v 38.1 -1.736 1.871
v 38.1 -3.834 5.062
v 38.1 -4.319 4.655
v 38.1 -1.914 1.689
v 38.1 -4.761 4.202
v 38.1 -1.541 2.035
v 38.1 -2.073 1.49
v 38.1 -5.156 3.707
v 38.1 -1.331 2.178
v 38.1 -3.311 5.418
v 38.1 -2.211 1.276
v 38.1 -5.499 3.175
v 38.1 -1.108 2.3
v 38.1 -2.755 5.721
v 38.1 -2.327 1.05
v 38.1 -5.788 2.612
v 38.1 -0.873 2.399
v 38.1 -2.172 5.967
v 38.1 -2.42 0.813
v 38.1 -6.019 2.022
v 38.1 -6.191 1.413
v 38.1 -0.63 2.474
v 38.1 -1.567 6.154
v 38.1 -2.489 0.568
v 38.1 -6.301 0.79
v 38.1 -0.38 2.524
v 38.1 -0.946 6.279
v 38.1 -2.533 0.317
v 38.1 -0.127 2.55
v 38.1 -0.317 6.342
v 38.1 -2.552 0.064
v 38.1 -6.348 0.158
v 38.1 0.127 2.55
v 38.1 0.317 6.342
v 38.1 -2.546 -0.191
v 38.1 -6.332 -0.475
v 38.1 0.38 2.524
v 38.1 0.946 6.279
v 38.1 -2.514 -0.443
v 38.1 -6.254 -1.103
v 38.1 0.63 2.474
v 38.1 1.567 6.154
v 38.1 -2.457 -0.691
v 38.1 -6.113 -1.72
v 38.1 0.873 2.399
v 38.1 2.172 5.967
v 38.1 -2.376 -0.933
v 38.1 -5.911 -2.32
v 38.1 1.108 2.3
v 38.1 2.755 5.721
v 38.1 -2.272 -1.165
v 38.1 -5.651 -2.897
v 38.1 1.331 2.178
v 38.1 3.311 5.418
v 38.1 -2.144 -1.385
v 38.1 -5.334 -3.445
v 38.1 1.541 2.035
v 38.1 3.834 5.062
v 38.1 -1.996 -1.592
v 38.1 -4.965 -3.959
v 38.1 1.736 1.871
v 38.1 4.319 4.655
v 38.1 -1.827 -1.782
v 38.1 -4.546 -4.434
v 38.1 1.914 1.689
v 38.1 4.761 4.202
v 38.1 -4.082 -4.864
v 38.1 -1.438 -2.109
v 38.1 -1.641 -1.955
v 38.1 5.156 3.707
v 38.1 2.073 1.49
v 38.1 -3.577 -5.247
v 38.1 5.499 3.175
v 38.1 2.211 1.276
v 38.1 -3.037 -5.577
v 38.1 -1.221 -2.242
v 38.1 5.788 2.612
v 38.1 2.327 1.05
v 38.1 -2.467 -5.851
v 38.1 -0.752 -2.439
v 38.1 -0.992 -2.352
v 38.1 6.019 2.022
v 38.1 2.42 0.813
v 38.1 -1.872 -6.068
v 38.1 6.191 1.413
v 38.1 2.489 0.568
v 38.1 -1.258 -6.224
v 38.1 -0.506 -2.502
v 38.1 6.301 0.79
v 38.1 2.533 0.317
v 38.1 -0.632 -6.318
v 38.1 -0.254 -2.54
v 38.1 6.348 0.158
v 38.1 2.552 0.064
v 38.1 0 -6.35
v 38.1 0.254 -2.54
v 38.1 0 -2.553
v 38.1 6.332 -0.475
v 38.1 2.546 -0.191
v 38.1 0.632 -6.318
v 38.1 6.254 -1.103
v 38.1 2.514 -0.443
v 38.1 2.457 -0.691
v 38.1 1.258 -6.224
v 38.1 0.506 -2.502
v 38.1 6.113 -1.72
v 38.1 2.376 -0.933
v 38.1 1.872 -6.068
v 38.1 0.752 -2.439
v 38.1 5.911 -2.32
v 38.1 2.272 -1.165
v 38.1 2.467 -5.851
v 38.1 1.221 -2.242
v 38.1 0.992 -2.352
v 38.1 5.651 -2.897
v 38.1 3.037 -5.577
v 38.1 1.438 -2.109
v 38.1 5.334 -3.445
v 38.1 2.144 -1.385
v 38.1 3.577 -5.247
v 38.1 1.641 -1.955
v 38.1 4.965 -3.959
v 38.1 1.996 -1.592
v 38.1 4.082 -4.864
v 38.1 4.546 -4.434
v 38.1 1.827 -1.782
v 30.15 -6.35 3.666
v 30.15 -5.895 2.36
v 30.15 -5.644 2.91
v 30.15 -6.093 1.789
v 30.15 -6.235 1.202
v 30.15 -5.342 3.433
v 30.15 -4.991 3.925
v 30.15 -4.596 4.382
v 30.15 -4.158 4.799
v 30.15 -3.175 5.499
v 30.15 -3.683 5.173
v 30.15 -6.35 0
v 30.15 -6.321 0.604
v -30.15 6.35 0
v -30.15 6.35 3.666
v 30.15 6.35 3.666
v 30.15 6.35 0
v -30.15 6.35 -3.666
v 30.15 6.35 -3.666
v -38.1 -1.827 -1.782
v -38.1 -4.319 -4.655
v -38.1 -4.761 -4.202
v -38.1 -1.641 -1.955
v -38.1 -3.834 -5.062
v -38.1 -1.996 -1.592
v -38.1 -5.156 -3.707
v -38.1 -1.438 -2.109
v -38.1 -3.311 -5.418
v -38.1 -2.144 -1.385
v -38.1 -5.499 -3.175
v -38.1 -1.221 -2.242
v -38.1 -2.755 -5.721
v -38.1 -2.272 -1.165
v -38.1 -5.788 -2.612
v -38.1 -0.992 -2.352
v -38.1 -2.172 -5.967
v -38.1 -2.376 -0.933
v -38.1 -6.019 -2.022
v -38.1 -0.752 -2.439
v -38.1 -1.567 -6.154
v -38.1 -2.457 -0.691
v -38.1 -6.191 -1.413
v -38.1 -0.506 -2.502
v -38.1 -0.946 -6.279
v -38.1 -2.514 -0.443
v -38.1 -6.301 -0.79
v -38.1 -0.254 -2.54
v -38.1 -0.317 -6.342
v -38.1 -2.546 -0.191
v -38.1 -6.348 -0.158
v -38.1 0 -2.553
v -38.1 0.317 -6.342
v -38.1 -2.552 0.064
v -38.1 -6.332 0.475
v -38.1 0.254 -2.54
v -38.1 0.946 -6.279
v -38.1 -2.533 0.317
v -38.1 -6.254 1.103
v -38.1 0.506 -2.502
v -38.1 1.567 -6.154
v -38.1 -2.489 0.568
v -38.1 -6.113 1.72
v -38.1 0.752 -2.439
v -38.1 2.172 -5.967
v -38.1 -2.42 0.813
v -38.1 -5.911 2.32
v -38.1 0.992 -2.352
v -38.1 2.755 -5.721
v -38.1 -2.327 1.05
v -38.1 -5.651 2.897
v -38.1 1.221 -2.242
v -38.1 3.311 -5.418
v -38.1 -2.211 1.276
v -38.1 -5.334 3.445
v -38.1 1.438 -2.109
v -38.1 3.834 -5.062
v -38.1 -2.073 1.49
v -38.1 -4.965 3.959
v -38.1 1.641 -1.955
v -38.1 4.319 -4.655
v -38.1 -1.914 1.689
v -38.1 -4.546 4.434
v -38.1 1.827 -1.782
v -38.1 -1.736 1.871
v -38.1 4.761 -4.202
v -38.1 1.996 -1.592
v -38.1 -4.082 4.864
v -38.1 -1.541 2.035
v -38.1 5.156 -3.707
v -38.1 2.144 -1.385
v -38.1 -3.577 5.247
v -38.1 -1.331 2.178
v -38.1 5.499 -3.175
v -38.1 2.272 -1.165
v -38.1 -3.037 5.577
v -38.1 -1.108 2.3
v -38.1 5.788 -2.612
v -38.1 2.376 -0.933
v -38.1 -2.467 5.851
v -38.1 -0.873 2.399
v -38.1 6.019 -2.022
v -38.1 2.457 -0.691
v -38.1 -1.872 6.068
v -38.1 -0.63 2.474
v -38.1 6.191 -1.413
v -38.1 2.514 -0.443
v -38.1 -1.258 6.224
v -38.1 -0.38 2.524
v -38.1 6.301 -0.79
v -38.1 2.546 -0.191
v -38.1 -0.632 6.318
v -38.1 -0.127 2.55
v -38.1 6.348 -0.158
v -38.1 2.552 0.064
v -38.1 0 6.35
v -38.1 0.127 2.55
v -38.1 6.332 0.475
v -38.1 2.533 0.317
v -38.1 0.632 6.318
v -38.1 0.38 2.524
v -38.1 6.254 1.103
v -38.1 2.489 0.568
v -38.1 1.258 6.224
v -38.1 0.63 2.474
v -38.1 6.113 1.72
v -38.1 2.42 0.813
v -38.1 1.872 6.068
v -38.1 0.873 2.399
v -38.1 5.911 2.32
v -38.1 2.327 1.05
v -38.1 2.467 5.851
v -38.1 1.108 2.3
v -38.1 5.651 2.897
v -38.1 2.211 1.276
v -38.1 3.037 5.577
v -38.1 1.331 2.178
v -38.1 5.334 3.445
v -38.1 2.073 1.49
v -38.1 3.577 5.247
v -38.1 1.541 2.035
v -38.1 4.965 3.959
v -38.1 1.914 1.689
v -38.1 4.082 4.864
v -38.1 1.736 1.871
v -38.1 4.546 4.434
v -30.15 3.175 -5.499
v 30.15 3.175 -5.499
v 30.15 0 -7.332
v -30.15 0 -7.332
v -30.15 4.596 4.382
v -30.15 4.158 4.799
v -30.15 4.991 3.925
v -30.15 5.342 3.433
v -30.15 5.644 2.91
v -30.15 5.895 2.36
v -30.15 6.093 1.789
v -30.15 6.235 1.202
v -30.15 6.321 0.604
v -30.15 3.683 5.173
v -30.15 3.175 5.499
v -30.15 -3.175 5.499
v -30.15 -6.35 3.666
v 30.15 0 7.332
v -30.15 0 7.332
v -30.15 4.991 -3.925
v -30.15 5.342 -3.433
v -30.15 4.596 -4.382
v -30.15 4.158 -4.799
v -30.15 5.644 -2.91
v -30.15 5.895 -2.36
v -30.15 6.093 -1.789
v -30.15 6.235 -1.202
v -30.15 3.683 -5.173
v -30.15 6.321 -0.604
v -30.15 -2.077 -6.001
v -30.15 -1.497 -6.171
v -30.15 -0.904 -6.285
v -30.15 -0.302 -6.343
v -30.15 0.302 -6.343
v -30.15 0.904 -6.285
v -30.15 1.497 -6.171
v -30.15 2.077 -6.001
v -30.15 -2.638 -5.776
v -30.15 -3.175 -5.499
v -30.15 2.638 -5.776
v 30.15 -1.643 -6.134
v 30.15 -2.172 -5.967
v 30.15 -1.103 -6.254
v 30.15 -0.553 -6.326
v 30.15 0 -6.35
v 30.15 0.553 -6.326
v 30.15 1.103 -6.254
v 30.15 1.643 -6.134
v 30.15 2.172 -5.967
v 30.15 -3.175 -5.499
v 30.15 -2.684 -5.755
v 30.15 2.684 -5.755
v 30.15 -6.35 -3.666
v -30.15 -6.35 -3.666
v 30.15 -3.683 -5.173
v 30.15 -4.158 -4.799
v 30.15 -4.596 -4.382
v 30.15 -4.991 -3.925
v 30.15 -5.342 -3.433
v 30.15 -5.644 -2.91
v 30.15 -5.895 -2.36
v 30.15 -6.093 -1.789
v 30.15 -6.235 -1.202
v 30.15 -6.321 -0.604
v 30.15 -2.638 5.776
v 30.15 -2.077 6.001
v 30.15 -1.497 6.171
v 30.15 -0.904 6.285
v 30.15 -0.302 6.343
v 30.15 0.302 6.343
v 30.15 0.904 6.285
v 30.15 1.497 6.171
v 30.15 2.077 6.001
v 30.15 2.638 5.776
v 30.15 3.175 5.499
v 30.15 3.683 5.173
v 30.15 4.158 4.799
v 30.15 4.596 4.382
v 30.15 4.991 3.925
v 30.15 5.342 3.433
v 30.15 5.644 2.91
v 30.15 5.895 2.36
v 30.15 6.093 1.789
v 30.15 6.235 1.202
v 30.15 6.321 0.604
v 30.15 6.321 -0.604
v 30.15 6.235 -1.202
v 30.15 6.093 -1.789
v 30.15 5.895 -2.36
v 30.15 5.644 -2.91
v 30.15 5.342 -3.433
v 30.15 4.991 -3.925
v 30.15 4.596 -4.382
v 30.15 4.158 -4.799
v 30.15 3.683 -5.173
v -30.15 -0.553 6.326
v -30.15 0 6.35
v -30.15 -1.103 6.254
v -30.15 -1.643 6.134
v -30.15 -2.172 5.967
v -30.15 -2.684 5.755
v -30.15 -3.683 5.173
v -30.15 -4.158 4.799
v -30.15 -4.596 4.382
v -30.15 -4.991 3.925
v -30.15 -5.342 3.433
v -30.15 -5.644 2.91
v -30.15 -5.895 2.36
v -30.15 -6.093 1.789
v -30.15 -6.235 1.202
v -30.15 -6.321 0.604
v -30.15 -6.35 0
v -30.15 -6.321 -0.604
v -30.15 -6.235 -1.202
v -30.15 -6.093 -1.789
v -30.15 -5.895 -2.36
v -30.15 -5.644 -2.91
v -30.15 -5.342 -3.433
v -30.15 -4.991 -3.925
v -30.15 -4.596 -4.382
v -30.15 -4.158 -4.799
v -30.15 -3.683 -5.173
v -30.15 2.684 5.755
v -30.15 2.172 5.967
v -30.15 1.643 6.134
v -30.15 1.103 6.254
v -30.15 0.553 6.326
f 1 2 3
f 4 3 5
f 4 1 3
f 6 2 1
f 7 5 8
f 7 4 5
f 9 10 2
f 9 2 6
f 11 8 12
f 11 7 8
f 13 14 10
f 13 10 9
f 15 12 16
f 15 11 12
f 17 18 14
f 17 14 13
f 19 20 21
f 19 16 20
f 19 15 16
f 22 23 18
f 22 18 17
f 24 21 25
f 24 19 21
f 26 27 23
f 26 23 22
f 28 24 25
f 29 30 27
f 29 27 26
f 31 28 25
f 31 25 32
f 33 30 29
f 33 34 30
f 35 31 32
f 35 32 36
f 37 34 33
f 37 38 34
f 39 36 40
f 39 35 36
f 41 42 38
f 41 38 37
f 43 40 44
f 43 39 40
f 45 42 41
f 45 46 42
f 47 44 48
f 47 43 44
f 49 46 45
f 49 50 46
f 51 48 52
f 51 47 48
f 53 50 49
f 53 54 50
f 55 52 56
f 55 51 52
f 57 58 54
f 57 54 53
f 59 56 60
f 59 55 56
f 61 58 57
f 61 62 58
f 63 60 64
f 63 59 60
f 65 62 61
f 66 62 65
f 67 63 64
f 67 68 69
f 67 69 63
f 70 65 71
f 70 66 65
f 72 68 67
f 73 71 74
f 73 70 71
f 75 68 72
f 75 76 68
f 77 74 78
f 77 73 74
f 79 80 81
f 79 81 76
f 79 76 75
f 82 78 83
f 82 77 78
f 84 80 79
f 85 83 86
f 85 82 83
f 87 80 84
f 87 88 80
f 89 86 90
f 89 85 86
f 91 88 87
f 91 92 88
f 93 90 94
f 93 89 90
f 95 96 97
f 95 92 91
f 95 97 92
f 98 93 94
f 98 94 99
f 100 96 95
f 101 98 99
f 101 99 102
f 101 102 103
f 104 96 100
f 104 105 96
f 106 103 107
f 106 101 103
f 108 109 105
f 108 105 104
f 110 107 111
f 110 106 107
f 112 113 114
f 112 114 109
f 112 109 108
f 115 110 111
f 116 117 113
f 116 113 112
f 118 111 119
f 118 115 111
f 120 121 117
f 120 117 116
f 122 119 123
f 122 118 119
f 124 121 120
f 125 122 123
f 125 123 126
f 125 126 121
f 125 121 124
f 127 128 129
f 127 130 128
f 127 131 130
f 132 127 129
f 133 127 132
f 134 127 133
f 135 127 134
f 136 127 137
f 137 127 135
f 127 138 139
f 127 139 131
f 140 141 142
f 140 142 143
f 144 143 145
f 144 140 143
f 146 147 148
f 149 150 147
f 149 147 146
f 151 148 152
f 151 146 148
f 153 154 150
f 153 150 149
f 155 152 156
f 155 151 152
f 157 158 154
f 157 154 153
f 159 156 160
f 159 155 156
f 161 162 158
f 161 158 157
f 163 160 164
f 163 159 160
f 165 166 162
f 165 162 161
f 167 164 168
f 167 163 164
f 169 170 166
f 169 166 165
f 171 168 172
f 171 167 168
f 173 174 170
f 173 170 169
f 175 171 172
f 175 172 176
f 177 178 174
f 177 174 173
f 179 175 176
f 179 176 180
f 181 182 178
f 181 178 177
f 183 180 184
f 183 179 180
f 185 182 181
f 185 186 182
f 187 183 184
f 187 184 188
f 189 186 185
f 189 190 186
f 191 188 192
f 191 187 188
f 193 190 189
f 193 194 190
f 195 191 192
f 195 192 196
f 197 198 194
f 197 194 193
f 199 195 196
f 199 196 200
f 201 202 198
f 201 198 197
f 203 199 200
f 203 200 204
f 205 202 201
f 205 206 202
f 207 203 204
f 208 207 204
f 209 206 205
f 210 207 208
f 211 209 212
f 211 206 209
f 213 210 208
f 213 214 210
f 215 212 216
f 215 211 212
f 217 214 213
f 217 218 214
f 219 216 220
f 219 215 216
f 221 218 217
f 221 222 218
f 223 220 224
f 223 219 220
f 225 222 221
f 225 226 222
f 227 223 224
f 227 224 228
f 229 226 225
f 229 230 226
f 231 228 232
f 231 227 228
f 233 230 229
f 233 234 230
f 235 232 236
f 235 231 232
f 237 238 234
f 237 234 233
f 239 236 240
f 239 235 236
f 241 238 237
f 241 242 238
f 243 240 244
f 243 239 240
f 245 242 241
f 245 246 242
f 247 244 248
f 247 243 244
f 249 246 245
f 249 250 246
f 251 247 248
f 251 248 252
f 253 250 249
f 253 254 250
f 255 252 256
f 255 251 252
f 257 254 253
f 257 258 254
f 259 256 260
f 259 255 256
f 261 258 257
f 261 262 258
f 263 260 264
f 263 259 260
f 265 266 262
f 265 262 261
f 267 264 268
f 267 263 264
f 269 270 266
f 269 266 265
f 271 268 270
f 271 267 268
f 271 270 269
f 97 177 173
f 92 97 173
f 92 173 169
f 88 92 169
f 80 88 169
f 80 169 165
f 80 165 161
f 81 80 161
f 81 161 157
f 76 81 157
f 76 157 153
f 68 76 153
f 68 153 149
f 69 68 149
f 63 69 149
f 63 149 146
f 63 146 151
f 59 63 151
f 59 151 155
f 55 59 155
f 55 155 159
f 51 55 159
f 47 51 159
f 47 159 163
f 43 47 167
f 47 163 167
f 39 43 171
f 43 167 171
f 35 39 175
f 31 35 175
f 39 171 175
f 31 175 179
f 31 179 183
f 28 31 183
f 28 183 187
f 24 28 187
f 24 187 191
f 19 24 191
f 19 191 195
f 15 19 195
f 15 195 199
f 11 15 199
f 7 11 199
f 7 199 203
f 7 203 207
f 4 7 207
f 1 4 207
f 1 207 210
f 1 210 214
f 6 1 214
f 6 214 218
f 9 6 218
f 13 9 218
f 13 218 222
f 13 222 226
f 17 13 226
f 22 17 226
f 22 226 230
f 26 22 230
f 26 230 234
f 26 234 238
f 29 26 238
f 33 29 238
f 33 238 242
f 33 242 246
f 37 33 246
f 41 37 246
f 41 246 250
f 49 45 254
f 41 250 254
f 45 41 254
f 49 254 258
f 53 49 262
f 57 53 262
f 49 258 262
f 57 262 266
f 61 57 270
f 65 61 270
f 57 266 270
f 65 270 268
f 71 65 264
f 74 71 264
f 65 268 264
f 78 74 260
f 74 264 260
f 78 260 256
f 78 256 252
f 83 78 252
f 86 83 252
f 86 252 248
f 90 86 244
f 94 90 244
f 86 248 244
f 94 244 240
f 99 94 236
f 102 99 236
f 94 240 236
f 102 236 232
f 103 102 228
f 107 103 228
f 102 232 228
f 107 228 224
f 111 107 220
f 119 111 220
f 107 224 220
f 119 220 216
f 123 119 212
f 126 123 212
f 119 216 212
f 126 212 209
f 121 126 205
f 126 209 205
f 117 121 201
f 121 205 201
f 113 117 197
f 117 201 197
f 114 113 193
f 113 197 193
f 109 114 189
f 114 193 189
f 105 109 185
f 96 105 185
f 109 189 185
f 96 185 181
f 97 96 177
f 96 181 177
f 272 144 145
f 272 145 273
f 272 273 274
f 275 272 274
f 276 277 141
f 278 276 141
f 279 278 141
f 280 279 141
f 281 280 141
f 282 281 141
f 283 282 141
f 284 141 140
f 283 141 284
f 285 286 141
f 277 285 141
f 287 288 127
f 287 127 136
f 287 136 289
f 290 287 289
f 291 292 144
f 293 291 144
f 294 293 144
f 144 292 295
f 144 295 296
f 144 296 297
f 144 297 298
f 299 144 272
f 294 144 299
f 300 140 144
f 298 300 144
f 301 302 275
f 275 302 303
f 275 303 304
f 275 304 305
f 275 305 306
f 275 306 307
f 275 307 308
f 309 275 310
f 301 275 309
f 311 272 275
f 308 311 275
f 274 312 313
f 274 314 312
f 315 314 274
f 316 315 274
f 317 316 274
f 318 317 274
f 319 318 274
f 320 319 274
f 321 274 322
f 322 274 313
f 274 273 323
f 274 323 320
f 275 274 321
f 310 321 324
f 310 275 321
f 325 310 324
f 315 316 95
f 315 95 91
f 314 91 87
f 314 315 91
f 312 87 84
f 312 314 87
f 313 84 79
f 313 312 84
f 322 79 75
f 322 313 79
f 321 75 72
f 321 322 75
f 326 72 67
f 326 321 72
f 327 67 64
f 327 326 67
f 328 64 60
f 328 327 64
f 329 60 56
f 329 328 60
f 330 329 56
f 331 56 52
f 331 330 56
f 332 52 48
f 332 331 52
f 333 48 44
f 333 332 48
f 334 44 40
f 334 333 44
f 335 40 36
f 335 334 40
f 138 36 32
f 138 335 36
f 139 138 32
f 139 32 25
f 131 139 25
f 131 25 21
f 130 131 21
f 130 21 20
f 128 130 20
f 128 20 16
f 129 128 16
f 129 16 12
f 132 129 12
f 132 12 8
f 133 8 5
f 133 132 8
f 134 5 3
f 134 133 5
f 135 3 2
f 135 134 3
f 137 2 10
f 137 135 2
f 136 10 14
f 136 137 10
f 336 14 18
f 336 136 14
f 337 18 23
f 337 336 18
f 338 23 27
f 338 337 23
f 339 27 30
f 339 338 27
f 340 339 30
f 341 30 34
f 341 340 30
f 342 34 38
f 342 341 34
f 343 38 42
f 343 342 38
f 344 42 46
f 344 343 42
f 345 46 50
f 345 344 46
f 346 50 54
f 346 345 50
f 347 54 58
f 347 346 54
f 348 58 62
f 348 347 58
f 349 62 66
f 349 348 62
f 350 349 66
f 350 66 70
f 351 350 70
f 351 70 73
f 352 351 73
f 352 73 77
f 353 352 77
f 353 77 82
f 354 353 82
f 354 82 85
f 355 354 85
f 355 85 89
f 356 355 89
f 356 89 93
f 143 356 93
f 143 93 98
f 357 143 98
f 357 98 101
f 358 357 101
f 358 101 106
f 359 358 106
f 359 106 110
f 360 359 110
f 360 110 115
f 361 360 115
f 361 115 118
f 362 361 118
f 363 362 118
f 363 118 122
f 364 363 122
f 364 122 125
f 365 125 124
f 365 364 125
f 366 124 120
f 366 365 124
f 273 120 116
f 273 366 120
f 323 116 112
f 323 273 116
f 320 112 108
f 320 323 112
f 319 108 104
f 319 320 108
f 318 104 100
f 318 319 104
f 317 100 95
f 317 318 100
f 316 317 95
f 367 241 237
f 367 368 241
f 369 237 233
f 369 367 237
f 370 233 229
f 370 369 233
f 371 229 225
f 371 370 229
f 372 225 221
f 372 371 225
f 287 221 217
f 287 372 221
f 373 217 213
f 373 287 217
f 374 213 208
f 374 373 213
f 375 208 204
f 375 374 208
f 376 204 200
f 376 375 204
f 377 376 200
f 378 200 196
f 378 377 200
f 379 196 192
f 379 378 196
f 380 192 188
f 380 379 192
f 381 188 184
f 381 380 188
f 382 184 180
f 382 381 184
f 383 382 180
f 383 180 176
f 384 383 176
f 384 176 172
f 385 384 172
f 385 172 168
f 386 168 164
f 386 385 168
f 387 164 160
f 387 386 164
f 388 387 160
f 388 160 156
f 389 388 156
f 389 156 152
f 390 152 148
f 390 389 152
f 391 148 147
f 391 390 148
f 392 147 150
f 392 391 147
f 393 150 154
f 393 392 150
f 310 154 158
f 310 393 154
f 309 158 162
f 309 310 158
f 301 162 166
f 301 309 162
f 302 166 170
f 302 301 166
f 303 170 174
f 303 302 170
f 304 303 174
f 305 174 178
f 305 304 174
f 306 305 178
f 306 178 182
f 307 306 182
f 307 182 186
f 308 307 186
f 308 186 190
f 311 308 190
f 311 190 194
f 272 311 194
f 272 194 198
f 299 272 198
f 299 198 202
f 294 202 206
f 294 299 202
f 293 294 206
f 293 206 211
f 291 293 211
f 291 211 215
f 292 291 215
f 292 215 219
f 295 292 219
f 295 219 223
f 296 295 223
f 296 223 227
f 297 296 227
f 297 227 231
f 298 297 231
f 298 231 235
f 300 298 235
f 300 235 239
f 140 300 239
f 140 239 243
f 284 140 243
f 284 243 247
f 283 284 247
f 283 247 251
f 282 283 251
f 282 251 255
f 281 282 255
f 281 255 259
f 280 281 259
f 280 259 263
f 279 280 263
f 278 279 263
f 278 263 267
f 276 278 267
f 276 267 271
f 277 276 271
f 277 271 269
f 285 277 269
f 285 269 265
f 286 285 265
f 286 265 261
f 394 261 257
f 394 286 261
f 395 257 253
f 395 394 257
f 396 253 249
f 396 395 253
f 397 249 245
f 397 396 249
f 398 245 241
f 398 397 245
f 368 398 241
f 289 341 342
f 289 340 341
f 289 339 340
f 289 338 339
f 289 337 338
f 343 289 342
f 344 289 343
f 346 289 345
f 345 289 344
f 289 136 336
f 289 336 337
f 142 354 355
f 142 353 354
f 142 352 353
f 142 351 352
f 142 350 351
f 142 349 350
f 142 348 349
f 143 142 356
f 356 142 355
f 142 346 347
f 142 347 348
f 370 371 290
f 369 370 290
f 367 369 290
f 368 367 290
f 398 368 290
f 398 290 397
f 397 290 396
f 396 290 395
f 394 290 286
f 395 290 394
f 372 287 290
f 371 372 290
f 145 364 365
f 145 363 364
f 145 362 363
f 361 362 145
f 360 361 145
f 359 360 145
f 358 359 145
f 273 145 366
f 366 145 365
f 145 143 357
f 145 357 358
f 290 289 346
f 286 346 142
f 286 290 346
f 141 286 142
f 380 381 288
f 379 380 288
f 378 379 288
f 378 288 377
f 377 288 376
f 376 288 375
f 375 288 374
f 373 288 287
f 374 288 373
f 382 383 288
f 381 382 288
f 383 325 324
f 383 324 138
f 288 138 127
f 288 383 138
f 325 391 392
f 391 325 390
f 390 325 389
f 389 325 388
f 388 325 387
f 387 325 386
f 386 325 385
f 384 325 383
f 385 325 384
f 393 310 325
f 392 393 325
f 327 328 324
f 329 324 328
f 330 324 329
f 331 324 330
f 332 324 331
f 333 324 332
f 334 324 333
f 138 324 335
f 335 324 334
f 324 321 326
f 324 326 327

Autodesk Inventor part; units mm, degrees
ref_plane "YZ Plane" through (0, 0, 0) normal (1, 0, 0) x (0, 1, 0)
ref_plane "XZ Plane" through (0, 0, 0) normal (0, 1, 0) x (-1, 0, 0)
ref_plane "XY Plane" through (0, 0, 0) normal (0, 0, 1) x (1, 0, 0)
sketch "Sketch1" plane through (0, 0, 0) normal (1, 0, 0) x (0, 1, 0)
  line L0 (0, -7.3323) -> (-6.35, -3.6662)
  line L1 (-6.35, -3.6662) -> (-6.35, 3.6662)
  line L2 (-6.35, 3.6662) -> (0, 7.3323)
  line L3 (0, 7.3323) -> (6.35, 3.6662)
  line L4 (6.35, 3.6662) -> (6.35, -3.6662)
  line L5 (6.35, -3.6662) -> (0, -7.3323)
  point P0 (0, 0)
  point P1 (0, 0)
  dimension "d0" = 12.7
extrude "Extrusion1" add sketch "Sketch1" along normal mid plane 60.2996
sketch "Sketch2" plane through (-30.1498, 0, 0) normal (-1, 0, 0) x (0, 0, 1)
  circle A0 centre (0, 0) radius 6.35
  dimension "d3" = 12.7
extrude "Extrusion2" add sketch "Sketch2" along normal blind 7.9502
sketch "Sketch3" plane through (30.1498, 0, 0) normal (1, 0, 0) x (0, 0, -1)
  circle A0 centre (0, 0) radius 6.35
  line L0 (3.6662, 6.35) -> (-3.6662, 6.35) projected
  line L1 (-3.6662, 6.35) -> (-7.3323, 0) projected
  line L2 (-7.3323, 0) -> (-3.6662, -6.35) projected
  line L3 (-3.6662, -6.35) -> (3.6662, -6.35) projected
  line L4 (3.6662, -6.35) -> (7.3323, 0) projected
  line L5 (7.3323, 0) -> (3.6662, 6.35) projected
  dimension "d6" = 12.7
extrude "Extrusion3" add sketch "Sketch3" along normal blind 7.9502 contours A0
sketch "Sketch4" plane through (38.1, 0, 0) normal (1, 0, 0) x (0, 0, -1)
  point P0 (0, 0)
  point P1 (0, 0)
hole "Hole1" at (38.1, 0, 0) direction (-1, 0, 0) diameter 5.1054 end through all clearance for "Flat Head Machine Screw (82)" size "#10" standard "Ansi Unified Screw Threads"
properties part number "EL2-GB-003" material "Aluminum 6061"
